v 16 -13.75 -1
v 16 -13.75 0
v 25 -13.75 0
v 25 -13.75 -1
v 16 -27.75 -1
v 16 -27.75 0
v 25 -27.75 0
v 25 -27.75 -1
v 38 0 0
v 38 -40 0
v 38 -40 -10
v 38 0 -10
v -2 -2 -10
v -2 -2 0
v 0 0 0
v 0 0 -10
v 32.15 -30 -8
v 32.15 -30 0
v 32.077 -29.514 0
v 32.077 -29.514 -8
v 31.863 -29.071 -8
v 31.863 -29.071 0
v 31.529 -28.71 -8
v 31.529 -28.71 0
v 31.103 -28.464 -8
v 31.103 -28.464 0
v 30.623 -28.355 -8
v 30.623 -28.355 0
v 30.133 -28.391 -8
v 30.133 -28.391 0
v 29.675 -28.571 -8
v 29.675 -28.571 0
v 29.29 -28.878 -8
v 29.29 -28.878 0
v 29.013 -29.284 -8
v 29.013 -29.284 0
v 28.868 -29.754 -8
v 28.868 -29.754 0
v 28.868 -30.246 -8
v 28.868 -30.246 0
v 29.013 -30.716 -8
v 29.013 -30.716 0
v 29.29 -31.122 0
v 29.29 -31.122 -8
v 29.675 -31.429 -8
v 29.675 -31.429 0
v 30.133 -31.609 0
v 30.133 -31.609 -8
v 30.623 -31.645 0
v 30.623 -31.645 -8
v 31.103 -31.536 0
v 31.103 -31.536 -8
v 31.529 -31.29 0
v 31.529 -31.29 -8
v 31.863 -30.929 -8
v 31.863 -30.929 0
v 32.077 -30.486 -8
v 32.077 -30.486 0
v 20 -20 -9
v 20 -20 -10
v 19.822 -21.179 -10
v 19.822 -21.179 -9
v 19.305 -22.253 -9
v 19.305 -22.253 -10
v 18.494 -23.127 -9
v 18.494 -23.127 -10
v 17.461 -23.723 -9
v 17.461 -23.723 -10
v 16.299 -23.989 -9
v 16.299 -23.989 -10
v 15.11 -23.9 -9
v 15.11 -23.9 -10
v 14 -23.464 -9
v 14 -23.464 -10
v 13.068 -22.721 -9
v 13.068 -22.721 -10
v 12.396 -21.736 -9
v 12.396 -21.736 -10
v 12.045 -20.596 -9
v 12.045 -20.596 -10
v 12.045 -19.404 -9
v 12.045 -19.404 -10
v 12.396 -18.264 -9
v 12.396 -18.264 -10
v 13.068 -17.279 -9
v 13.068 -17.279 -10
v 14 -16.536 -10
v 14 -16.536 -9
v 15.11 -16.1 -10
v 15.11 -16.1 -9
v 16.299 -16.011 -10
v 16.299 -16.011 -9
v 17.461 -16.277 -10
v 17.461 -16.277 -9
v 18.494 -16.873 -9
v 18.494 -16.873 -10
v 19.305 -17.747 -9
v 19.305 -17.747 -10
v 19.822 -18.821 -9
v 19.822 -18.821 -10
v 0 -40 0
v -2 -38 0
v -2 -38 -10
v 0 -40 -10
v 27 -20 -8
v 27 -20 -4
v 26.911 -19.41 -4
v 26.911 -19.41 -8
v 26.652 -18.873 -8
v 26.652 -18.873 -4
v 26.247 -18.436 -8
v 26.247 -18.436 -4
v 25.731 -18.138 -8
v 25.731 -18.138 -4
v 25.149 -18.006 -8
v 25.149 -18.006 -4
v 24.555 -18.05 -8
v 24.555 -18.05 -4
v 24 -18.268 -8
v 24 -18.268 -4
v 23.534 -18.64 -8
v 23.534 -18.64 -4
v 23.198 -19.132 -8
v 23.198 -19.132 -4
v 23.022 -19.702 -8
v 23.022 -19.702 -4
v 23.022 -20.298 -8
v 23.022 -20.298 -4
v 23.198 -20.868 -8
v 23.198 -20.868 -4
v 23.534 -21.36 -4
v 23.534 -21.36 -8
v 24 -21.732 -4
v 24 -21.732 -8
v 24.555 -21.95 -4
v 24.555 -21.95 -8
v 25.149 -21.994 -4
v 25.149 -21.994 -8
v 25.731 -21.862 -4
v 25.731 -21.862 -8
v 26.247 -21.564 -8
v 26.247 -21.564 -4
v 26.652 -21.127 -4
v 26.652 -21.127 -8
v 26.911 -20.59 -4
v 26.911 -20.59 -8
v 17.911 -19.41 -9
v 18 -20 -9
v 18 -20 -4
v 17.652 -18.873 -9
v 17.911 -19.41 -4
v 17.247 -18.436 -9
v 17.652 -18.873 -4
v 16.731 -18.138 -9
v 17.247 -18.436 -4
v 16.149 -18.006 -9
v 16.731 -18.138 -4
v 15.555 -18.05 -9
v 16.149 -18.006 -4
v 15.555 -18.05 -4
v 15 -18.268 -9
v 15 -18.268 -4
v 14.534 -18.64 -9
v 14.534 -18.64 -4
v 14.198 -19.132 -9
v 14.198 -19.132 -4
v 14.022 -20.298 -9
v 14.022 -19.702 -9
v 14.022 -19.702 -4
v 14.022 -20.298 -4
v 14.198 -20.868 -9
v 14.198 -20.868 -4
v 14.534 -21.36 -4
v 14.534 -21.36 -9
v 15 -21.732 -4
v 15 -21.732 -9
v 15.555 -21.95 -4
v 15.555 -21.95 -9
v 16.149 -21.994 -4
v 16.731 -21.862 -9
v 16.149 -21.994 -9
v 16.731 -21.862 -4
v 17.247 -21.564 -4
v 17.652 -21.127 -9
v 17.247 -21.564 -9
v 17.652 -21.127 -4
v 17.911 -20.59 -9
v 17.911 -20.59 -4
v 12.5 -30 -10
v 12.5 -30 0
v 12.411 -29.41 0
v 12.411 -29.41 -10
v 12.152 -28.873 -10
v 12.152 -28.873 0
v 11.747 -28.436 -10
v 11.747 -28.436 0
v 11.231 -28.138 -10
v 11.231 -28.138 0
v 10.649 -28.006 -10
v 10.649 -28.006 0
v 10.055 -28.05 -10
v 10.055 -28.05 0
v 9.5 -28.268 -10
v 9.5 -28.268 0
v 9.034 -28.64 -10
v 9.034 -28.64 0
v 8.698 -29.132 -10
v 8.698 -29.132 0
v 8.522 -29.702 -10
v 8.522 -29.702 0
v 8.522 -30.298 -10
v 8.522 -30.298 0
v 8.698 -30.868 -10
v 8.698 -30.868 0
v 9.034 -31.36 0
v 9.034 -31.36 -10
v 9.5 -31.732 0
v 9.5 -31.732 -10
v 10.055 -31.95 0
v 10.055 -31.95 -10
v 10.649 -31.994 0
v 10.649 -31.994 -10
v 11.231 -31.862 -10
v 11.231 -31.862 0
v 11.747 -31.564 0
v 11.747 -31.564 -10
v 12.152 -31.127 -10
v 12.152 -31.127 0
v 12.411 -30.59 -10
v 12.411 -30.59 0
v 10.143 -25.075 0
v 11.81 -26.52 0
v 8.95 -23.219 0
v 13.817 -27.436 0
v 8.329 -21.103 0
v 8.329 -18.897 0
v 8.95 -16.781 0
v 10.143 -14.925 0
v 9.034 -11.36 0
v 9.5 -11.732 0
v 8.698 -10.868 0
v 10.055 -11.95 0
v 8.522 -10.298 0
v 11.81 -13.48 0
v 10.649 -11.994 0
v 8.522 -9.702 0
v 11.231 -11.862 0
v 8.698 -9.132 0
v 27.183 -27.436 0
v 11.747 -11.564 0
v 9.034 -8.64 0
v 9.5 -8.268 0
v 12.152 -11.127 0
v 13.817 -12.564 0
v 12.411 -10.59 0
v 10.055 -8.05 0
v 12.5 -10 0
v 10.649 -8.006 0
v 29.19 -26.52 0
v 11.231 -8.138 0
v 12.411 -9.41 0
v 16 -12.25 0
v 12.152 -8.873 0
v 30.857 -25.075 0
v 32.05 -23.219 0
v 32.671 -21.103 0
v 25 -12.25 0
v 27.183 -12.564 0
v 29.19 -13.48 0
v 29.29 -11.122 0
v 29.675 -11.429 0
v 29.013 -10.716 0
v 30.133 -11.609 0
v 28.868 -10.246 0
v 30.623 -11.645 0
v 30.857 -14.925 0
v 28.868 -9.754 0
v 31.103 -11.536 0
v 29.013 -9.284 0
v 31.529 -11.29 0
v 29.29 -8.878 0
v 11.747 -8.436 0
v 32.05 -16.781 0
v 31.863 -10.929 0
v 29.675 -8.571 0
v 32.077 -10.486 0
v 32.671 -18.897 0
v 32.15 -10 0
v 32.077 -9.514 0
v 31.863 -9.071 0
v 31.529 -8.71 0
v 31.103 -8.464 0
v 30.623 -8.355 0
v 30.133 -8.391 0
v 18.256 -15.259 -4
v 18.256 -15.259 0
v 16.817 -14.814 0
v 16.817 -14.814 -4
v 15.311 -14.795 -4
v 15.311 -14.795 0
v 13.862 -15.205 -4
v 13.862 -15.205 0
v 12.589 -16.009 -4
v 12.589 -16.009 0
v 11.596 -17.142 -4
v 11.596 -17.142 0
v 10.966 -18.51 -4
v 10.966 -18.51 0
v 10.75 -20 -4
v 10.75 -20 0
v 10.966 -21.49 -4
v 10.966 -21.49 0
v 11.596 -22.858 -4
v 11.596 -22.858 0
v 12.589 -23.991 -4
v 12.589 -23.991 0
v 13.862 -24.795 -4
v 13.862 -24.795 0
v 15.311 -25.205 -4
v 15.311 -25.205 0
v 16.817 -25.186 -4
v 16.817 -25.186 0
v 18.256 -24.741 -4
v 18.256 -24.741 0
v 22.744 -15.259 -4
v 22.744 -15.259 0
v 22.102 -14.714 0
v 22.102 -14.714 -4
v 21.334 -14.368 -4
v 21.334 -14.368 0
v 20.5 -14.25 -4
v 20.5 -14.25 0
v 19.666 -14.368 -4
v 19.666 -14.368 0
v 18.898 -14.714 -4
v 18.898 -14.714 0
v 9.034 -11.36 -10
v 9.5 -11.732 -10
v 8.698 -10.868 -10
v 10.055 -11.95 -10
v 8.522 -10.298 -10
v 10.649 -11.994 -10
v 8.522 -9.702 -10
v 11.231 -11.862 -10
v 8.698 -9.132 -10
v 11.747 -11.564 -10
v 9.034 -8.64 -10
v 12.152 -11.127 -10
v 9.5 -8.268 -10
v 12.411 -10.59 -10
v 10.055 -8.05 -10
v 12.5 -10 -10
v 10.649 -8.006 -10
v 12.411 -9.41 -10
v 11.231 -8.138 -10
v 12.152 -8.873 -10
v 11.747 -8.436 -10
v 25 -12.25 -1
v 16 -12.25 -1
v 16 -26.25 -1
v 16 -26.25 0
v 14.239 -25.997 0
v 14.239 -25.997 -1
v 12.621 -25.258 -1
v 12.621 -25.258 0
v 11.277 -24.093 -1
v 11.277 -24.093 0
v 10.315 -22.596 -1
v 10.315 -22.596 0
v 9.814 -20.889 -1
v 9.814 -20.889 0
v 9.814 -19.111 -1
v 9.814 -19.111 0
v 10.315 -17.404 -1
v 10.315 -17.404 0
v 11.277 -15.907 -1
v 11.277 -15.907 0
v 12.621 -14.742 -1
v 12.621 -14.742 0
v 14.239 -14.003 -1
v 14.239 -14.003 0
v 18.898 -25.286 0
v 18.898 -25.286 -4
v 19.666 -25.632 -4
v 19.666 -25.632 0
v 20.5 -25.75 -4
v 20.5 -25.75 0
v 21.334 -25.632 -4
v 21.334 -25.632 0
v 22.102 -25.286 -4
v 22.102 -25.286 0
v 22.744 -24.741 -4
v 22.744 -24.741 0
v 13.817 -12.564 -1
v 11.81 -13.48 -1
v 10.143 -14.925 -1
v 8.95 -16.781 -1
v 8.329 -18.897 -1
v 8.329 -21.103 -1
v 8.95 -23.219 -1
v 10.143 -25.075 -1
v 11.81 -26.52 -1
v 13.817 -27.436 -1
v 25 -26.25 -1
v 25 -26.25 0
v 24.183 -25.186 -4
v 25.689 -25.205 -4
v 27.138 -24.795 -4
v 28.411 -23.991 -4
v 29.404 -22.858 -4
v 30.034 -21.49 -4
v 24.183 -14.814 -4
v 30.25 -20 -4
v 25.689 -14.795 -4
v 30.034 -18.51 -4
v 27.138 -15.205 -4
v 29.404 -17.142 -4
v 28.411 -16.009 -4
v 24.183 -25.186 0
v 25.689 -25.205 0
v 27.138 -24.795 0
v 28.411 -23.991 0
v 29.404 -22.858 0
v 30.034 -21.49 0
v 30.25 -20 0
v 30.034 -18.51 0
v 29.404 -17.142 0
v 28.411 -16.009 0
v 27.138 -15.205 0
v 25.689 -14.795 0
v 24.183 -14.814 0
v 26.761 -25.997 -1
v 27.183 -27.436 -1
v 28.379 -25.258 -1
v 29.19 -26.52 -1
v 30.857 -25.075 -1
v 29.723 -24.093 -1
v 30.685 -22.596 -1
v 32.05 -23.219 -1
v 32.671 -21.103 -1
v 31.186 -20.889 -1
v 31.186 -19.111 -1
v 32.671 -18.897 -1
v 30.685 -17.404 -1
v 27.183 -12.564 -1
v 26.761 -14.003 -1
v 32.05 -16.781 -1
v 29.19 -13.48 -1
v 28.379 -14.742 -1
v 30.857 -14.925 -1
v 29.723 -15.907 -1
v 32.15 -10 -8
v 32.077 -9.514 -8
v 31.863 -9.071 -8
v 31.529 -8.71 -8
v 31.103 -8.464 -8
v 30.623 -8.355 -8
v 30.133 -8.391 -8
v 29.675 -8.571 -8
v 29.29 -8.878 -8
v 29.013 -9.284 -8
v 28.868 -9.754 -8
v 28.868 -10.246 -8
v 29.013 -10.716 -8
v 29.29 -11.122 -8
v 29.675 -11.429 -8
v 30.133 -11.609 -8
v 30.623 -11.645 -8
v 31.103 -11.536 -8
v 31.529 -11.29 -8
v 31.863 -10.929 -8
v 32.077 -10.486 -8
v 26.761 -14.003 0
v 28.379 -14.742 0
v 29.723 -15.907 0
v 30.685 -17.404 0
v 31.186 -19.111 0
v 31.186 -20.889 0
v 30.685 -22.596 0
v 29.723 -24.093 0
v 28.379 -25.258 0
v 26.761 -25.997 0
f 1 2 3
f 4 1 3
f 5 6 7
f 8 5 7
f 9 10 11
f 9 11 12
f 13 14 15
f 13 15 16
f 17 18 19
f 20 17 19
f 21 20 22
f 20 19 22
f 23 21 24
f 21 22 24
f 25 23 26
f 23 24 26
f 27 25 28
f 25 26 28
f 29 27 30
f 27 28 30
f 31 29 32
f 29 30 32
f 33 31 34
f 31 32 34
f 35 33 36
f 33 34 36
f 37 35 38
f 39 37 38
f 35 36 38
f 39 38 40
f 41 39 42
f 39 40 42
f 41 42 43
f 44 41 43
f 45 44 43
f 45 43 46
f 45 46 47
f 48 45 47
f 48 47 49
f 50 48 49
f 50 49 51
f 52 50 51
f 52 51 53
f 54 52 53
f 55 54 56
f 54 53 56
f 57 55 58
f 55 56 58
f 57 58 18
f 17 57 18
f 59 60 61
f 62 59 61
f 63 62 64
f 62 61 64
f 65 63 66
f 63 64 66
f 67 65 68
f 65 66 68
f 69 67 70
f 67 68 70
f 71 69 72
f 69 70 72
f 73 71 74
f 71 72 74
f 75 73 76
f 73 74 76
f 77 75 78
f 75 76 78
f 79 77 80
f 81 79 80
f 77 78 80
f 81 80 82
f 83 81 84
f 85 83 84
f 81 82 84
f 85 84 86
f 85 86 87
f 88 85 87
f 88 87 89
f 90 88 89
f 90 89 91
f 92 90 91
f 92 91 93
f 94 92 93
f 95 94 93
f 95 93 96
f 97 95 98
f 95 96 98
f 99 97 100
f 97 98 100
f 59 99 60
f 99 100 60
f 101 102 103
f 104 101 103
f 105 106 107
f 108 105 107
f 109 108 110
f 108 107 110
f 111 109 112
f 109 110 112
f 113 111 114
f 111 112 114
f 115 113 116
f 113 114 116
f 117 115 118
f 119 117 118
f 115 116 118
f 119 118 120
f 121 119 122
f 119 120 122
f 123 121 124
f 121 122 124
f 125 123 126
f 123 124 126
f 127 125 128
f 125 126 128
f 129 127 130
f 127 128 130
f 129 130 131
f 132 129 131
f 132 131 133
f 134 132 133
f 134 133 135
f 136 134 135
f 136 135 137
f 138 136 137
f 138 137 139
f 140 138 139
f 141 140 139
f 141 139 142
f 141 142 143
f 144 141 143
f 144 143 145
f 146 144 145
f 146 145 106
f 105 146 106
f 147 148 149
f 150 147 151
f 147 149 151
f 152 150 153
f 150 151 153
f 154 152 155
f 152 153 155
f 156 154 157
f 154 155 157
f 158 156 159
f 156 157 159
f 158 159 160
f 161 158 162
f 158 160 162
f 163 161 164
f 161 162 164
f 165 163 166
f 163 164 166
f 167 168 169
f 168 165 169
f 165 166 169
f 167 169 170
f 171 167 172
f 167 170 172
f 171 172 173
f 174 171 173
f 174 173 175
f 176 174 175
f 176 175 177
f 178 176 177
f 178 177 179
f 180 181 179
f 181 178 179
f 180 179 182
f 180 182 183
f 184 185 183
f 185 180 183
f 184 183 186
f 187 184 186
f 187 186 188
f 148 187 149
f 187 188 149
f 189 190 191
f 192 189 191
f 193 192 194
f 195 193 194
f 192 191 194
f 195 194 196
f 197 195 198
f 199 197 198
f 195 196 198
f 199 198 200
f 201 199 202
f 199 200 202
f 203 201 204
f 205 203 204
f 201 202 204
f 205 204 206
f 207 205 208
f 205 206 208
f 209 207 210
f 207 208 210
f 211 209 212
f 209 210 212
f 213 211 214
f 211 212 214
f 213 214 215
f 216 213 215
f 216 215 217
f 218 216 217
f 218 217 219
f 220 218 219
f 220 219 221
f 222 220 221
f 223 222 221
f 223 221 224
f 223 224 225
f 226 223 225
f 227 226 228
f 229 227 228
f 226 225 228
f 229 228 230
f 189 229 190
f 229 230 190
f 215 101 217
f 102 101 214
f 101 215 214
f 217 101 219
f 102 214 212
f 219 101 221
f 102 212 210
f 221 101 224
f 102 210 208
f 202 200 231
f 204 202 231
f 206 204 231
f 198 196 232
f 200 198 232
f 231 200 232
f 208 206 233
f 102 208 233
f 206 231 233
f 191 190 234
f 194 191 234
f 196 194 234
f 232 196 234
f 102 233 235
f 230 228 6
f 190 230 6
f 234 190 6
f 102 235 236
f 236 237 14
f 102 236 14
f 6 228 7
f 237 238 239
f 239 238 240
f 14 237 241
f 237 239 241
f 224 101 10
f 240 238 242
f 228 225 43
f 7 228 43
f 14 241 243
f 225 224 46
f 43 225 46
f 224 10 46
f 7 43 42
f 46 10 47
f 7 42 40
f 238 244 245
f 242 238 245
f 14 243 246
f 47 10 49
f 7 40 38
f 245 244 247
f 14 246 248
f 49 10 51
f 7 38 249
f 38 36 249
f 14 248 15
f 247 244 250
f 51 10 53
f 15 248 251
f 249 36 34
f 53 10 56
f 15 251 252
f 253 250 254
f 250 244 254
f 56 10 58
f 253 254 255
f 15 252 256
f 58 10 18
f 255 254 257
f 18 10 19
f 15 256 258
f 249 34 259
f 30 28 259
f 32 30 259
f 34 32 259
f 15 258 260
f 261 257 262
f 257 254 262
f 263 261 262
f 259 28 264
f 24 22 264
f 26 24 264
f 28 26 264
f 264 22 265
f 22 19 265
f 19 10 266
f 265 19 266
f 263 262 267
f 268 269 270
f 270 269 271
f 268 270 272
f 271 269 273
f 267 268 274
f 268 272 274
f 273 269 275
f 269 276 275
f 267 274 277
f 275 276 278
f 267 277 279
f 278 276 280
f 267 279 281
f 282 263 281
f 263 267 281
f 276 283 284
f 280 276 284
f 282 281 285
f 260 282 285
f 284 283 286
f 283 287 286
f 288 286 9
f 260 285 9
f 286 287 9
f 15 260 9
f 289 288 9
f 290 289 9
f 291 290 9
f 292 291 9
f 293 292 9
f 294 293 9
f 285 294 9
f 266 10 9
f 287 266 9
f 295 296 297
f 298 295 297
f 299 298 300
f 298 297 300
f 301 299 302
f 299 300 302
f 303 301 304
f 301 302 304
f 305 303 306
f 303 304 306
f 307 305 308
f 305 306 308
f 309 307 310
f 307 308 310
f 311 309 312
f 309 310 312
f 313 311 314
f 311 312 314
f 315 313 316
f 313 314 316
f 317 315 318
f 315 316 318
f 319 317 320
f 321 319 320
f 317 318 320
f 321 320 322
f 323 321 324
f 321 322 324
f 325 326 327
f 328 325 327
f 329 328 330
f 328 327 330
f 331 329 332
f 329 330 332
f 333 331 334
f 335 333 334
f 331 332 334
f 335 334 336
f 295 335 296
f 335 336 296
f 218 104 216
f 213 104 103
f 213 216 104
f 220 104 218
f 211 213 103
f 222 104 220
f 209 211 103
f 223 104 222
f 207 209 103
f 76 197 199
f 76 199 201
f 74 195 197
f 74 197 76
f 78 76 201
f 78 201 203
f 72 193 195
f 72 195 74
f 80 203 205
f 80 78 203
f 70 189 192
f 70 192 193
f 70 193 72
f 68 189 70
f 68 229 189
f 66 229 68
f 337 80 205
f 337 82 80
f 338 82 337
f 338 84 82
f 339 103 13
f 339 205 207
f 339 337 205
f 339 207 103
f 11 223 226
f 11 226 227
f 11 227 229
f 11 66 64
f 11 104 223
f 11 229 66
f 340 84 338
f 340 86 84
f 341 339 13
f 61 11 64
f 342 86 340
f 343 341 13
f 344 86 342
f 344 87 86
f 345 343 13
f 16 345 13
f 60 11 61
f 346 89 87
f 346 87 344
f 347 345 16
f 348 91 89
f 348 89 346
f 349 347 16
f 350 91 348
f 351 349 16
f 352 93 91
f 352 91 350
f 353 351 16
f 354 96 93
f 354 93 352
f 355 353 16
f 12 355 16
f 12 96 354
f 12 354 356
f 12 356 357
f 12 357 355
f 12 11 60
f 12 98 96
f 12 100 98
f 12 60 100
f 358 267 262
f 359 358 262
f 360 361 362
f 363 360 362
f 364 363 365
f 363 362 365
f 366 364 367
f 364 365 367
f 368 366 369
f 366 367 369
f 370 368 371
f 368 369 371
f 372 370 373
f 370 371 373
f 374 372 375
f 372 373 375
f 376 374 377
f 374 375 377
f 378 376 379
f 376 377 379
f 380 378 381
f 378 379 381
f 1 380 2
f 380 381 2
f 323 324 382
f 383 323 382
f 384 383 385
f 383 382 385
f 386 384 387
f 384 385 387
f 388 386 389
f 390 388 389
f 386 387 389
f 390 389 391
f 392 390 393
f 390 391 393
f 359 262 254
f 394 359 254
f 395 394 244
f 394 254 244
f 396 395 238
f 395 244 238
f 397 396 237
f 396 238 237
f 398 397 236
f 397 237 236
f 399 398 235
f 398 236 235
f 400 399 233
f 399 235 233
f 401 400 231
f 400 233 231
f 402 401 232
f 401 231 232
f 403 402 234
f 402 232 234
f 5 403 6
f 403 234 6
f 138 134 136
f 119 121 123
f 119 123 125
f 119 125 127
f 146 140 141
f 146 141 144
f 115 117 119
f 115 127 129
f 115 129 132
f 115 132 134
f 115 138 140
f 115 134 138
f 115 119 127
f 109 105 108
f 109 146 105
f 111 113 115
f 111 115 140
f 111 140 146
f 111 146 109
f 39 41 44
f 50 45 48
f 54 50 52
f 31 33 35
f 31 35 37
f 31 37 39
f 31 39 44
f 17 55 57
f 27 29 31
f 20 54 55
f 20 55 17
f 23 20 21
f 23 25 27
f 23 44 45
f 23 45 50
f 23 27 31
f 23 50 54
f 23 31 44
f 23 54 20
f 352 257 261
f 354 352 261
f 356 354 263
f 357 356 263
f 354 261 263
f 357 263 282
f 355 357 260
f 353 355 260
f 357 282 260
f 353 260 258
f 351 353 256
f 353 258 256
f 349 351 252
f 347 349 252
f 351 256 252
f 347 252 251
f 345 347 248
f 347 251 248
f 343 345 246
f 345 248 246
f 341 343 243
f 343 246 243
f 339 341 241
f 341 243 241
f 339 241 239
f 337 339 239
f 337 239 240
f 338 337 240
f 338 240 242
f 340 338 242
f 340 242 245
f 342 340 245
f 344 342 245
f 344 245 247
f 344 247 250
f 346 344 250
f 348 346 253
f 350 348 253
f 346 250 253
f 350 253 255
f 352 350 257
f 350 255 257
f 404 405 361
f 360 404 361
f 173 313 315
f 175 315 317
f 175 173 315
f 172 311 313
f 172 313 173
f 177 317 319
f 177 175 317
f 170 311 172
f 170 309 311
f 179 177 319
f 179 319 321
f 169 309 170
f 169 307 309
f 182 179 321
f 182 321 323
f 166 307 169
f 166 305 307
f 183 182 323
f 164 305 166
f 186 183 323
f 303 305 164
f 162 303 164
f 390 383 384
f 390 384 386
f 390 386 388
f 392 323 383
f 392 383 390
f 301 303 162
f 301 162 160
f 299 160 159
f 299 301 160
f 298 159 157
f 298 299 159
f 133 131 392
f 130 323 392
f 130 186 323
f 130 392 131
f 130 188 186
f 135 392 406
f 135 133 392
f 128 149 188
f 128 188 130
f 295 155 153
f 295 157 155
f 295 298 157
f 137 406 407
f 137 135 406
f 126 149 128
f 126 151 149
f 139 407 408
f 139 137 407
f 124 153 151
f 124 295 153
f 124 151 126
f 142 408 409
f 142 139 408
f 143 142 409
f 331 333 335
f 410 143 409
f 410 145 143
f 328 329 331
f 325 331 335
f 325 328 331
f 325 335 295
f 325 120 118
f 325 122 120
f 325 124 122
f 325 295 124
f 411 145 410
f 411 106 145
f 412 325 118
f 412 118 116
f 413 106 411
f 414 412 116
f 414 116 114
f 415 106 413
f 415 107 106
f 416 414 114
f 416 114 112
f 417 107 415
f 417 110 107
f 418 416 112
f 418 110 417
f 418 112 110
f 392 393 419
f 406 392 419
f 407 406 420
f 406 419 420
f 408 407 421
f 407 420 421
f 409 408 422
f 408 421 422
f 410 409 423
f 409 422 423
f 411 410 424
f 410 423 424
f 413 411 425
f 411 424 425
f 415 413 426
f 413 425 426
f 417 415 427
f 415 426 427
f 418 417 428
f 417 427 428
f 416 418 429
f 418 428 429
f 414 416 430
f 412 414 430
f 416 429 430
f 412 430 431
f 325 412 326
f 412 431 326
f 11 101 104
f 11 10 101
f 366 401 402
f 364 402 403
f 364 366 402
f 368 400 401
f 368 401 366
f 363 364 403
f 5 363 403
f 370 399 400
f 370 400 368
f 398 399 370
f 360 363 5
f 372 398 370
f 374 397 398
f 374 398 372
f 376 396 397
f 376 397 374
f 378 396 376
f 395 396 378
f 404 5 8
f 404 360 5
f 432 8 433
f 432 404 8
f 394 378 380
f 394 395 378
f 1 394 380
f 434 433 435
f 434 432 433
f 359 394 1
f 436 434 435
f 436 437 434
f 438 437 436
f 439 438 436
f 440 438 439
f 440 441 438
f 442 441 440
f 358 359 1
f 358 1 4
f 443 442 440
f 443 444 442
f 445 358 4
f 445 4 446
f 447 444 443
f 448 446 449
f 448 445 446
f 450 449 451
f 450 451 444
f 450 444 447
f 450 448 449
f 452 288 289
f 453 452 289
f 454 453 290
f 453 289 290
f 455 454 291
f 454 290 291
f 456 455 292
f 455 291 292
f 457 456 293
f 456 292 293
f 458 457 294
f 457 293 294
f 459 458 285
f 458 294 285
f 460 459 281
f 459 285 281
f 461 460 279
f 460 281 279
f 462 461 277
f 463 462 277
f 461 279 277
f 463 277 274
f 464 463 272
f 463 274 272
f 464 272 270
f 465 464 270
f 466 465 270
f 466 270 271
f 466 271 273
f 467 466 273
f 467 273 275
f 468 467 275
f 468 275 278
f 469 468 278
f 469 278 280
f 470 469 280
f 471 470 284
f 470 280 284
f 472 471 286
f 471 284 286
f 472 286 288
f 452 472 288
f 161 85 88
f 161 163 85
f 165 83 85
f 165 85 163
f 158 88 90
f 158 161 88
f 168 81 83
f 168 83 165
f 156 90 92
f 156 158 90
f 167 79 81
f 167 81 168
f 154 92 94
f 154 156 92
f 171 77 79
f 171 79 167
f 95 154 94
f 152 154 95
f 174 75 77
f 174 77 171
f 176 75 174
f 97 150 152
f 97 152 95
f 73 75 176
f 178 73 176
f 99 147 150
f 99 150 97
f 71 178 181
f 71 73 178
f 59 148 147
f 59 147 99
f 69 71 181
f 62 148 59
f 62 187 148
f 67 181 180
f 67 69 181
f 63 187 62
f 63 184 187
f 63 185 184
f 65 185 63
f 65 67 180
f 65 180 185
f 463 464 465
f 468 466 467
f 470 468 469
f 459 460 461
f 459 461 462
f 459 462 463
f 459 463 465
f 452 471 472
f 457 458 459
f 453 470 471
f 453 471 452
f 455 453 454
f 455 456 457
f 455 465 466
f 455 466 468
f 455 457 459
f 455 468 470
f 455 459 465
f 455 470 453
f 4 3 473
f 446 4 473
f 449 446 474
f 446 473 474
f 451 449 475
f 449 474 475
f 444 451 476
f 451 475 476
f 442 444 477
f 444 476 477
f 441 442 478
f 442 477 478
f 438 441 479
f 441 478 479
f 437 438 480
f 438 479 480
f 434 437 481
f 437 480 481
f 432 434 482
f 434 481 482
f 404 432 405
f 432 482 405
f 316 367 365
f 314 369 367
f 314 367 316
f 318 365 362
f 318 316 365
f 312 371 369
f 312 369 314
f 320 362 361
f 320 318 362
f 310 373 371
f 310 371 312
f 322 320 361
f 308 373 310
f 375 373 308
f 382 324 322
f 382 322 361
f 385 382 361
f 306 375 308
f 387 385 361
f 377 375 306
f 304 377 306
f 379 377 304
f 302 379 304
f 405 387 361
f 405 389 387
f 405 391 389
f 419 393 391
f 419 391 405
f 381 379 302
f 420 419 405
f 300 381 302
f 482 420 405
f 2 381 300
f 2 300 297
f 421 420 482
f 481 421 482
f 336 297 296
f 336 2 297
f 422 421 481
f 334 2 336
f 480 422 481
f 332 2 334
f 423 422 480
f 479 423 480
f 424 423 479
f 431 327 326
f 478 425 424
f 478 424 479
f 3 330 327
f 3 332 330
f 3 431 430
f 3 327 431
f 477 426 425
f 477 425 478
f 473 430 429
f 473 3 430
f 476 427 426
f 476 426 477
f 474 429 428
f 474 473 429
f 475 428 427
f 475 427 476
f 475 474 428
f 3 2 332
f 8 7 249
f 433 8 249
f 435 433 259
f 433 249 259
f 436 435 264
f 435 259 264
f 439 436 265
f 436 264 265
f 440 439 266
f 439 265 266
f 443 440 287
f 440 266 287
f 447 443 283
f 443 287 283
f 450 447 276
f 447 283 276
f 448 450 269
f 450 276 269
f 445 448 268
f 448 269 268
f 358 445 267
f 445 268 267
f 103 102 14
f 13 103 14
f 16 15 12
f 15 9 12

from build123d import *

# Parameters (mm, degrees)
F0_W      = 41
F0_H      = 40
F0_R      = 2
F0_R_2    = 1.65
F1_DEPTH  = 10
F2_DEPTH  = 1
F3_DEPTH  = 8
F4_DEPTH  = 4
F5_R      = 4
F5_R_2    = 2
F6_DEPTH  = 1
F7_DEPTH  = 8
F8_DEPTH  = 2
F9_SIZE   = 2
F10_DEPTH = 3


# Not quite as in the source:
# - a feature names something its author has since deleted; it is built from what else it names


with BuildPart() as f1:
    # F0 (on Top) → F1 (new body)
    with BuildSketch(Plane.XY):
        with Locations((20.5, -20)):
            Rectangle(F0_W, F0_H)
        with Locations((10.5, -30)):
            Circle(F0_R, mode=Mode.SUBTRACT)
        with Locations((30.5, -30)):
            Circle(F0_R_2, mode=Mode.SUBTRACT)
        with Locations((10.5, -10)):
            Circle(F0_R, mode=Mode.SUBTRACT)
        with BuildLine():
            Line((25, -27.75), (16, -27.75))
            ThreePointArc((16, -27.75), (8.25, -20), (16, -12.25))
            Line((16, -12.25), (25, -12.25))
            ThreePointArc((25, -12.25), (32.75, -20), (25, -27.75))
        make_face(mode=Mode.SUBTRACT)
        with Locations((30.5, -10)):
            Circle(F0_R_2, mode=Mode.SUBTRACT)
        with BuildLine():
            ThreePointArc((16, -12.25), (8.25, -20), (16, -27.75))
            Line((16, -27.75), (25, -27.75))
            ThreePointArc((25, -27.75), (32.75, -20), (25, -12.25))
            Line((25, -12.25), (16, -12.25))
        make_face()
        with BuildLine():
            ThreePointArc((16, -26.25), (9.75, -20), (16, -13.75))
            Line((16, -13.75), (25, -13.75))
            ThreePointArc((25, -13.75), (31.25, -20), (25, -26.25))
            Line((25, -26.25), (16, -26.25))
        make_face(mode=Mode.SUBTRACT)
        with BuildLine():
            Line((25, -13.75), (16, -13.75))
            ThreePointArc((16, -13.75), (9.75, -20), (16, -26.25))
            Line((16, -26.25), (25, -26.25))
            ThreePointArc((25, -26.25), (31.25, -20), (25, -13.75))
        make_face()
        with BuildLine():
            ThreePointArc((22.7443308628, -15.25927677), (30.25, -20), (22.7443308628, -24.74072323))
            ThreePointArc((22.7443308628, -24.74072323), (20.5, -25.75), (18.2556691372, -24.74072323))
            ThreePointArc((18.2556691372, -24.74072323), (10.75, -20), (18.2556691372, -15.25927677))
            ThreePointArc((18.2556691372, -15.25927677), (20.5, -14.25), (22.7443308628, -15.25927677))
        make_face(mode=Mode.SUBTRACT)
        with BuildLine():
            ThreePointArc((18.2556691372, -24.74072323), (20.5, -25.75), (22.7443308628, -24.74072323))
            ThreePointArc((22.7443308628, -24.74072323), (30.25, -20), (22.7443308628, -15.25927677))
            ThreePointArc((22.7443308628, -15.25927677), (20.5, -14.25), (18.2556691372, -15.25927677))
            ThreePointArc((18.2556691372, -15.25927677), (10.75, -20), (18.2556691372, -24.74072323))
        make_face()
        with Locations((16, -20)):
            Circle(F0_R, mode=Mode.SUBTRACT)
        with Locations((25, -20)):
            Circle(F0_R, mode=Mode.SUBTRACT)
        with Locations((25, -20)):
            Circle(F0_R)
        with Locations((30.5, -10)):
            Circle(F0_R_2)
        with Locations((30.5, -30)):
            Circle(F0_R_2)
    extrude(amount=-F1_DEPTH)

    # F0 (on Top) → F2 (cut)
    with BuildSketch(Plane.XY):
        with BuildLine():
            ThreePointArc((16, -12.25), (8.25, -20), (16, -27.75))
            Line((16, -27.75), (25, -27.75))
            ThreePointArc((25, -27.75), (32.75, -20), (25, -12.25))
            Line((25, -12.25), (16, -12.25))
        make_face()
        with BuildLine():
            ThreePointArc((16, -26.25), (9.75, -20), (16, -13.75))
            Line((16, -13.75), (25, -13.75))
            ThreePointArc((25, -13.75), (31.25, -20), (25, -26.25))
            Line((25, -26.25), (16, -26.25))
        make_face(mode=Mode.SUBTRACT)
    extrude(amount=-F2_DEPTH, mode=Mode.SUBTRACT)

    # F0 (on Top) → F3 (cut)
    with BuildSketch(Plane.XY):
        with Locations((25, -20)):
            Circle(F0_R)
    extrude(amount=-F3_DEPTH, mode=Mode.SUBTRACT)

    # F0 (on Top) → F4 (cut)
    with BuildSketch(Plane.XY):
        with BuildLine():
            ThreePointArc((18.2556691372, -24.74072323), (20.5, -25.75), (22.7443308628, -24.74072323))
            ThreePointArc((22.7443308628, -24.74072323), (30.25, -20), (22.7443308628, -15.25927677))
            ThreePointArc((22.7443308628, -15.25927677), (20.5, -14.25), (18.2556691372, -15.25927677))
            ThreePointArc((18.2556691372, -15.25927677), (10.75, -20), (18.2556691372, -24.74072323))
        make_face()
        with Locations((16, -20)):
            Circle(F0_R, mode=Mode.SUBTRACT)
        with Locations((25, -20)):
            Circle(F0_R, mode=Mode.SUBTRACT)
    extrude(amount=-F4_DEPTH, mode=Mode.SUBTRACT)

    # F5 (on face) → F6 (cut)
    with BuildSketch(Plane(origin=(0, 0, -10), x_dir=(1, 0, 0), z_dir=(0, 0, -1))):
        with Locations((16, 20)):
            Circle(F5_R)
        with Locations((16, 20)):
            Circle(F5_R_2, mode=Mode.SUBTRACT)
    extrude(amount=-F6_DEPTH, mode=Mode.SUBTRACT)

    # F0 (on Top) → F7 (cut)
    with BuildSketch(Plane.XY):
        with Locations((30.5, -30)):
            Circle(F0_R_2)
        with Locations((30.5, -10)):
            Circle(F0_R_2)
    extrude(amount=-F7_DEPTH, mode=Mode.SUBTRACT)

    # F8 (add): a face of the model
    f8_faces = [f1.faces().sort_by_distance(p)[0] for p in [
        (0, -20, -5),
    ]]
    extrude(f8_faces, amount=F8_DEPTH)

    # F9
    f9_edges = [f1.edges().sort_by_distance(p)[0] for p in [
        (-2, -40, -5),
        (-2, 0, -5),
    ]]
    chamfer(f9_edges, length=F9_SIZE)

    # F10 (cut): a face of the model
    f10_faces = [f1.faces().sort_by_distance(p)[0] for p in [
        (41, -20, -5),
    ]]
    extrude(f10_faces, amount=-F10_DEPTH, mode=Mode.SUBTRACT)


solid = f1.part
